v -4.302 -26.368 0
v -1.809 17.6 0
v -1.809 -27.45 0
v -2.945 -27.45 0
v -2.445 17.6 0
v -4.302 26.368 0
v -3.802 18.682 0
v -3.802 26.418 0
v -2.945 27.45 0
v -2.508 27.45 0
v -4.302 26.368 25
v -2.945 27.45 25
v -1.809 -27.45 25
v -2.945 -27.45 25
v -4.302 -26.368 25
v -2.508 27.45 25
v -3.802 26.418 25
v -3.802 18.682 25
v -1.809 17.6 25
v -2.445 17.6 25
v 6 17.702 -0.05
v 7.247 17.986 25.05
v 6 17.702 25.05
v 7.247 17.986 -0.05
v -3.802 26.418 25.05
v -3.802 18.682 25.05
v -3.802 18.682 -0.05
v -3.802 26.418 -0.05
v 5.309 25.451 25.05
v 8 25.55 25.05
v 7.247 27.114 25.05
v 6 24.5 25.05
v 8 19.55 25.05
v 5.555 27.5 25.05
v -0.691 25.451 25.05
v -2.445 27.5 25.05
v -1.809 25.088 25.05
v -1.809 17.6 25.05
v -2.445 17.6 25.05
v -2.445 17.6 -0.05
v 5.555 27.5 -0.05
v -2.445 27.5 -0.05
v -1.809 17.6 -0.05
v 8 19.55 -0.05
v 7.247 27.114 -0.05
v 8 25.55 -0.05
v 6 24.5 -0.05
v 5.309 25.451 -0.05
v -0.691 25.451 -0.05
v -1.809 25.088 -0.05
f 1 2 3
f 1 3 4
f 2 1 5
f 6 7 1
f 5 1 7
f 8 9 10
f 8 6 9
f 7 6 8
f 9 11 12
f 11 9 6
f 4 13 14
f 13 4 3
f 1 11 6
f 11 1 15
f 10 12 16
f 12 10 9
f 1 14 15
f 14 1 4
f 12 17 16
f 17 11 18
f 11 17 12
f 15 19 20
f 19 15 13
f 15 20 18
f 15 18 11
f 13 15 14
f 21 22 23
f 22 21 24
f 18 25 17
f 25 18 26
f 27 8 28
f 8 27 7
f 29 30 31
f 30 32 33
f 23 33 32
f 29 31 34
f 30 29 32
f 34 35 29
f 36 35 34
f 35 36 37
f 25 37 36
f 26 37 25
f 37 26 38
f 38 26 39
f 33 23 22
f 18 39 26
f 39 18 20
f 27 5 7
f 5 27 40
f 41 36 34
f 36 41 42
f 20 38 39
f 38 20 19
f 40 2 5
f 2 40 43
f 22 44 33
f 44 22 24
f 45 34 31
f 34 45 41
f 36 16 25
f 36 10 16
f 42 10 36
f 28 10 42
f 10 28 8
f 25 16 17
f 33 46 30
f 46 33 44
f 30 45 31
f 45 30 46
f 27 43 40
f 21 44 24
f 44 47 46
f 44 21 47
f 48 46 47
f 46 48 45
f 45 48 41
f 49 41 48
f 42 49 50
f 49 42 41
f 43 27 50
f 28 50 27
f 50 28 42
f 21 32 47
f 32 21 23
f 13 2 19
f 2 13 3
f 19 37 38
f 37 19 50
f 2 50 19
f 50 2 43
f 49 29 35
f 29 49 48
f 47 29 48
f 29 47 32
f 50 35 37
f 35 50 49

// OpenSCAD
//Curve smoothness, from 1 to 3.
quality = 3; //[1:draft, 2:meh, 3:best]

//Thickness of the rail. Used as the interior distance between the inner and outer sides of the fence posts.
rail_thickness = 8;
//Height of the rail from top face to bottom face.
rail_height = 25.4;
//Radius of each of the corners of the rail's cross-section.
rail_edge_radius = 1;

//Height of each of the fence posts.
fence_post_inner_height = 55;
//Height of the clip portion, on the other side of the rail.
fence_post_outer_height = 10;

//Length on the rail covered by the fence post.
fence_post_length = 25;

//Thickness of the fence post—the distance of the exterior edges of the post from the interior edges/the rail.
fence_post_thickness = 2;

module rounded_square(dims, r=2, thickness=1) {
	hull() {
		translate([0, 0, thickness * 0.5]) {
			translate([dims[0] * -0.5 + r, dims[1] * -0.5 + r, 0]) cylinder(r=r, h=thickness, center=true);
			translate([dims[0] * +0.5 - r, dims[1] * -0.5 + r, 0]) cylinder(r=r, h=thickness, center=true);
			translate([dims[0] * -0.5 + r, dims[1] * +0.5 - r, 0]) cylinder(r=r, h=thickness, center=true);
			translate([dims[0] * +0.5 - r, dims[1] * +0.5 - r, 0]) cylinder(r=r, h=thickness, center=true);
		}
	}
}

module rail() {
color("white")
rounded_square([rail_thickness, rail_height], r=rail_edge_radius, thickness=fence_post_length * 2);
}

difference() {
union() {
rounded_square([rail_thickness + fence_post_thickness / 2, fence_post_inner_height], r=rail_edge_radius * 2, thickness=fence_post_length);
//color("red")
translate([fence_post_thickness, fence_post_inner_height * 0.5 - fence_post_outer_height * 0.5 + 0.05, -0.05])
rounded_square([rail_thickness + fence_post_thickness * 2, fence_post_outer_height], r=rail_edge_radius * 2, thickness=fence_post_length + 0.1);
}

*translate([fence_post_thickness - rail_edge_radius, (fence_post_inner_height * 0.5 - rail_height * 0.5) - rail_edge_radius, 0])
rail();

translate([fence_post_thickness, -fence_post_thickness, fence_post_length * -0.5])
//color("blue")
rounded_square([rail_thickness, fence_post_inner_height], r=rail_edge_radius, thickness=fence_post_length * 2);
}
